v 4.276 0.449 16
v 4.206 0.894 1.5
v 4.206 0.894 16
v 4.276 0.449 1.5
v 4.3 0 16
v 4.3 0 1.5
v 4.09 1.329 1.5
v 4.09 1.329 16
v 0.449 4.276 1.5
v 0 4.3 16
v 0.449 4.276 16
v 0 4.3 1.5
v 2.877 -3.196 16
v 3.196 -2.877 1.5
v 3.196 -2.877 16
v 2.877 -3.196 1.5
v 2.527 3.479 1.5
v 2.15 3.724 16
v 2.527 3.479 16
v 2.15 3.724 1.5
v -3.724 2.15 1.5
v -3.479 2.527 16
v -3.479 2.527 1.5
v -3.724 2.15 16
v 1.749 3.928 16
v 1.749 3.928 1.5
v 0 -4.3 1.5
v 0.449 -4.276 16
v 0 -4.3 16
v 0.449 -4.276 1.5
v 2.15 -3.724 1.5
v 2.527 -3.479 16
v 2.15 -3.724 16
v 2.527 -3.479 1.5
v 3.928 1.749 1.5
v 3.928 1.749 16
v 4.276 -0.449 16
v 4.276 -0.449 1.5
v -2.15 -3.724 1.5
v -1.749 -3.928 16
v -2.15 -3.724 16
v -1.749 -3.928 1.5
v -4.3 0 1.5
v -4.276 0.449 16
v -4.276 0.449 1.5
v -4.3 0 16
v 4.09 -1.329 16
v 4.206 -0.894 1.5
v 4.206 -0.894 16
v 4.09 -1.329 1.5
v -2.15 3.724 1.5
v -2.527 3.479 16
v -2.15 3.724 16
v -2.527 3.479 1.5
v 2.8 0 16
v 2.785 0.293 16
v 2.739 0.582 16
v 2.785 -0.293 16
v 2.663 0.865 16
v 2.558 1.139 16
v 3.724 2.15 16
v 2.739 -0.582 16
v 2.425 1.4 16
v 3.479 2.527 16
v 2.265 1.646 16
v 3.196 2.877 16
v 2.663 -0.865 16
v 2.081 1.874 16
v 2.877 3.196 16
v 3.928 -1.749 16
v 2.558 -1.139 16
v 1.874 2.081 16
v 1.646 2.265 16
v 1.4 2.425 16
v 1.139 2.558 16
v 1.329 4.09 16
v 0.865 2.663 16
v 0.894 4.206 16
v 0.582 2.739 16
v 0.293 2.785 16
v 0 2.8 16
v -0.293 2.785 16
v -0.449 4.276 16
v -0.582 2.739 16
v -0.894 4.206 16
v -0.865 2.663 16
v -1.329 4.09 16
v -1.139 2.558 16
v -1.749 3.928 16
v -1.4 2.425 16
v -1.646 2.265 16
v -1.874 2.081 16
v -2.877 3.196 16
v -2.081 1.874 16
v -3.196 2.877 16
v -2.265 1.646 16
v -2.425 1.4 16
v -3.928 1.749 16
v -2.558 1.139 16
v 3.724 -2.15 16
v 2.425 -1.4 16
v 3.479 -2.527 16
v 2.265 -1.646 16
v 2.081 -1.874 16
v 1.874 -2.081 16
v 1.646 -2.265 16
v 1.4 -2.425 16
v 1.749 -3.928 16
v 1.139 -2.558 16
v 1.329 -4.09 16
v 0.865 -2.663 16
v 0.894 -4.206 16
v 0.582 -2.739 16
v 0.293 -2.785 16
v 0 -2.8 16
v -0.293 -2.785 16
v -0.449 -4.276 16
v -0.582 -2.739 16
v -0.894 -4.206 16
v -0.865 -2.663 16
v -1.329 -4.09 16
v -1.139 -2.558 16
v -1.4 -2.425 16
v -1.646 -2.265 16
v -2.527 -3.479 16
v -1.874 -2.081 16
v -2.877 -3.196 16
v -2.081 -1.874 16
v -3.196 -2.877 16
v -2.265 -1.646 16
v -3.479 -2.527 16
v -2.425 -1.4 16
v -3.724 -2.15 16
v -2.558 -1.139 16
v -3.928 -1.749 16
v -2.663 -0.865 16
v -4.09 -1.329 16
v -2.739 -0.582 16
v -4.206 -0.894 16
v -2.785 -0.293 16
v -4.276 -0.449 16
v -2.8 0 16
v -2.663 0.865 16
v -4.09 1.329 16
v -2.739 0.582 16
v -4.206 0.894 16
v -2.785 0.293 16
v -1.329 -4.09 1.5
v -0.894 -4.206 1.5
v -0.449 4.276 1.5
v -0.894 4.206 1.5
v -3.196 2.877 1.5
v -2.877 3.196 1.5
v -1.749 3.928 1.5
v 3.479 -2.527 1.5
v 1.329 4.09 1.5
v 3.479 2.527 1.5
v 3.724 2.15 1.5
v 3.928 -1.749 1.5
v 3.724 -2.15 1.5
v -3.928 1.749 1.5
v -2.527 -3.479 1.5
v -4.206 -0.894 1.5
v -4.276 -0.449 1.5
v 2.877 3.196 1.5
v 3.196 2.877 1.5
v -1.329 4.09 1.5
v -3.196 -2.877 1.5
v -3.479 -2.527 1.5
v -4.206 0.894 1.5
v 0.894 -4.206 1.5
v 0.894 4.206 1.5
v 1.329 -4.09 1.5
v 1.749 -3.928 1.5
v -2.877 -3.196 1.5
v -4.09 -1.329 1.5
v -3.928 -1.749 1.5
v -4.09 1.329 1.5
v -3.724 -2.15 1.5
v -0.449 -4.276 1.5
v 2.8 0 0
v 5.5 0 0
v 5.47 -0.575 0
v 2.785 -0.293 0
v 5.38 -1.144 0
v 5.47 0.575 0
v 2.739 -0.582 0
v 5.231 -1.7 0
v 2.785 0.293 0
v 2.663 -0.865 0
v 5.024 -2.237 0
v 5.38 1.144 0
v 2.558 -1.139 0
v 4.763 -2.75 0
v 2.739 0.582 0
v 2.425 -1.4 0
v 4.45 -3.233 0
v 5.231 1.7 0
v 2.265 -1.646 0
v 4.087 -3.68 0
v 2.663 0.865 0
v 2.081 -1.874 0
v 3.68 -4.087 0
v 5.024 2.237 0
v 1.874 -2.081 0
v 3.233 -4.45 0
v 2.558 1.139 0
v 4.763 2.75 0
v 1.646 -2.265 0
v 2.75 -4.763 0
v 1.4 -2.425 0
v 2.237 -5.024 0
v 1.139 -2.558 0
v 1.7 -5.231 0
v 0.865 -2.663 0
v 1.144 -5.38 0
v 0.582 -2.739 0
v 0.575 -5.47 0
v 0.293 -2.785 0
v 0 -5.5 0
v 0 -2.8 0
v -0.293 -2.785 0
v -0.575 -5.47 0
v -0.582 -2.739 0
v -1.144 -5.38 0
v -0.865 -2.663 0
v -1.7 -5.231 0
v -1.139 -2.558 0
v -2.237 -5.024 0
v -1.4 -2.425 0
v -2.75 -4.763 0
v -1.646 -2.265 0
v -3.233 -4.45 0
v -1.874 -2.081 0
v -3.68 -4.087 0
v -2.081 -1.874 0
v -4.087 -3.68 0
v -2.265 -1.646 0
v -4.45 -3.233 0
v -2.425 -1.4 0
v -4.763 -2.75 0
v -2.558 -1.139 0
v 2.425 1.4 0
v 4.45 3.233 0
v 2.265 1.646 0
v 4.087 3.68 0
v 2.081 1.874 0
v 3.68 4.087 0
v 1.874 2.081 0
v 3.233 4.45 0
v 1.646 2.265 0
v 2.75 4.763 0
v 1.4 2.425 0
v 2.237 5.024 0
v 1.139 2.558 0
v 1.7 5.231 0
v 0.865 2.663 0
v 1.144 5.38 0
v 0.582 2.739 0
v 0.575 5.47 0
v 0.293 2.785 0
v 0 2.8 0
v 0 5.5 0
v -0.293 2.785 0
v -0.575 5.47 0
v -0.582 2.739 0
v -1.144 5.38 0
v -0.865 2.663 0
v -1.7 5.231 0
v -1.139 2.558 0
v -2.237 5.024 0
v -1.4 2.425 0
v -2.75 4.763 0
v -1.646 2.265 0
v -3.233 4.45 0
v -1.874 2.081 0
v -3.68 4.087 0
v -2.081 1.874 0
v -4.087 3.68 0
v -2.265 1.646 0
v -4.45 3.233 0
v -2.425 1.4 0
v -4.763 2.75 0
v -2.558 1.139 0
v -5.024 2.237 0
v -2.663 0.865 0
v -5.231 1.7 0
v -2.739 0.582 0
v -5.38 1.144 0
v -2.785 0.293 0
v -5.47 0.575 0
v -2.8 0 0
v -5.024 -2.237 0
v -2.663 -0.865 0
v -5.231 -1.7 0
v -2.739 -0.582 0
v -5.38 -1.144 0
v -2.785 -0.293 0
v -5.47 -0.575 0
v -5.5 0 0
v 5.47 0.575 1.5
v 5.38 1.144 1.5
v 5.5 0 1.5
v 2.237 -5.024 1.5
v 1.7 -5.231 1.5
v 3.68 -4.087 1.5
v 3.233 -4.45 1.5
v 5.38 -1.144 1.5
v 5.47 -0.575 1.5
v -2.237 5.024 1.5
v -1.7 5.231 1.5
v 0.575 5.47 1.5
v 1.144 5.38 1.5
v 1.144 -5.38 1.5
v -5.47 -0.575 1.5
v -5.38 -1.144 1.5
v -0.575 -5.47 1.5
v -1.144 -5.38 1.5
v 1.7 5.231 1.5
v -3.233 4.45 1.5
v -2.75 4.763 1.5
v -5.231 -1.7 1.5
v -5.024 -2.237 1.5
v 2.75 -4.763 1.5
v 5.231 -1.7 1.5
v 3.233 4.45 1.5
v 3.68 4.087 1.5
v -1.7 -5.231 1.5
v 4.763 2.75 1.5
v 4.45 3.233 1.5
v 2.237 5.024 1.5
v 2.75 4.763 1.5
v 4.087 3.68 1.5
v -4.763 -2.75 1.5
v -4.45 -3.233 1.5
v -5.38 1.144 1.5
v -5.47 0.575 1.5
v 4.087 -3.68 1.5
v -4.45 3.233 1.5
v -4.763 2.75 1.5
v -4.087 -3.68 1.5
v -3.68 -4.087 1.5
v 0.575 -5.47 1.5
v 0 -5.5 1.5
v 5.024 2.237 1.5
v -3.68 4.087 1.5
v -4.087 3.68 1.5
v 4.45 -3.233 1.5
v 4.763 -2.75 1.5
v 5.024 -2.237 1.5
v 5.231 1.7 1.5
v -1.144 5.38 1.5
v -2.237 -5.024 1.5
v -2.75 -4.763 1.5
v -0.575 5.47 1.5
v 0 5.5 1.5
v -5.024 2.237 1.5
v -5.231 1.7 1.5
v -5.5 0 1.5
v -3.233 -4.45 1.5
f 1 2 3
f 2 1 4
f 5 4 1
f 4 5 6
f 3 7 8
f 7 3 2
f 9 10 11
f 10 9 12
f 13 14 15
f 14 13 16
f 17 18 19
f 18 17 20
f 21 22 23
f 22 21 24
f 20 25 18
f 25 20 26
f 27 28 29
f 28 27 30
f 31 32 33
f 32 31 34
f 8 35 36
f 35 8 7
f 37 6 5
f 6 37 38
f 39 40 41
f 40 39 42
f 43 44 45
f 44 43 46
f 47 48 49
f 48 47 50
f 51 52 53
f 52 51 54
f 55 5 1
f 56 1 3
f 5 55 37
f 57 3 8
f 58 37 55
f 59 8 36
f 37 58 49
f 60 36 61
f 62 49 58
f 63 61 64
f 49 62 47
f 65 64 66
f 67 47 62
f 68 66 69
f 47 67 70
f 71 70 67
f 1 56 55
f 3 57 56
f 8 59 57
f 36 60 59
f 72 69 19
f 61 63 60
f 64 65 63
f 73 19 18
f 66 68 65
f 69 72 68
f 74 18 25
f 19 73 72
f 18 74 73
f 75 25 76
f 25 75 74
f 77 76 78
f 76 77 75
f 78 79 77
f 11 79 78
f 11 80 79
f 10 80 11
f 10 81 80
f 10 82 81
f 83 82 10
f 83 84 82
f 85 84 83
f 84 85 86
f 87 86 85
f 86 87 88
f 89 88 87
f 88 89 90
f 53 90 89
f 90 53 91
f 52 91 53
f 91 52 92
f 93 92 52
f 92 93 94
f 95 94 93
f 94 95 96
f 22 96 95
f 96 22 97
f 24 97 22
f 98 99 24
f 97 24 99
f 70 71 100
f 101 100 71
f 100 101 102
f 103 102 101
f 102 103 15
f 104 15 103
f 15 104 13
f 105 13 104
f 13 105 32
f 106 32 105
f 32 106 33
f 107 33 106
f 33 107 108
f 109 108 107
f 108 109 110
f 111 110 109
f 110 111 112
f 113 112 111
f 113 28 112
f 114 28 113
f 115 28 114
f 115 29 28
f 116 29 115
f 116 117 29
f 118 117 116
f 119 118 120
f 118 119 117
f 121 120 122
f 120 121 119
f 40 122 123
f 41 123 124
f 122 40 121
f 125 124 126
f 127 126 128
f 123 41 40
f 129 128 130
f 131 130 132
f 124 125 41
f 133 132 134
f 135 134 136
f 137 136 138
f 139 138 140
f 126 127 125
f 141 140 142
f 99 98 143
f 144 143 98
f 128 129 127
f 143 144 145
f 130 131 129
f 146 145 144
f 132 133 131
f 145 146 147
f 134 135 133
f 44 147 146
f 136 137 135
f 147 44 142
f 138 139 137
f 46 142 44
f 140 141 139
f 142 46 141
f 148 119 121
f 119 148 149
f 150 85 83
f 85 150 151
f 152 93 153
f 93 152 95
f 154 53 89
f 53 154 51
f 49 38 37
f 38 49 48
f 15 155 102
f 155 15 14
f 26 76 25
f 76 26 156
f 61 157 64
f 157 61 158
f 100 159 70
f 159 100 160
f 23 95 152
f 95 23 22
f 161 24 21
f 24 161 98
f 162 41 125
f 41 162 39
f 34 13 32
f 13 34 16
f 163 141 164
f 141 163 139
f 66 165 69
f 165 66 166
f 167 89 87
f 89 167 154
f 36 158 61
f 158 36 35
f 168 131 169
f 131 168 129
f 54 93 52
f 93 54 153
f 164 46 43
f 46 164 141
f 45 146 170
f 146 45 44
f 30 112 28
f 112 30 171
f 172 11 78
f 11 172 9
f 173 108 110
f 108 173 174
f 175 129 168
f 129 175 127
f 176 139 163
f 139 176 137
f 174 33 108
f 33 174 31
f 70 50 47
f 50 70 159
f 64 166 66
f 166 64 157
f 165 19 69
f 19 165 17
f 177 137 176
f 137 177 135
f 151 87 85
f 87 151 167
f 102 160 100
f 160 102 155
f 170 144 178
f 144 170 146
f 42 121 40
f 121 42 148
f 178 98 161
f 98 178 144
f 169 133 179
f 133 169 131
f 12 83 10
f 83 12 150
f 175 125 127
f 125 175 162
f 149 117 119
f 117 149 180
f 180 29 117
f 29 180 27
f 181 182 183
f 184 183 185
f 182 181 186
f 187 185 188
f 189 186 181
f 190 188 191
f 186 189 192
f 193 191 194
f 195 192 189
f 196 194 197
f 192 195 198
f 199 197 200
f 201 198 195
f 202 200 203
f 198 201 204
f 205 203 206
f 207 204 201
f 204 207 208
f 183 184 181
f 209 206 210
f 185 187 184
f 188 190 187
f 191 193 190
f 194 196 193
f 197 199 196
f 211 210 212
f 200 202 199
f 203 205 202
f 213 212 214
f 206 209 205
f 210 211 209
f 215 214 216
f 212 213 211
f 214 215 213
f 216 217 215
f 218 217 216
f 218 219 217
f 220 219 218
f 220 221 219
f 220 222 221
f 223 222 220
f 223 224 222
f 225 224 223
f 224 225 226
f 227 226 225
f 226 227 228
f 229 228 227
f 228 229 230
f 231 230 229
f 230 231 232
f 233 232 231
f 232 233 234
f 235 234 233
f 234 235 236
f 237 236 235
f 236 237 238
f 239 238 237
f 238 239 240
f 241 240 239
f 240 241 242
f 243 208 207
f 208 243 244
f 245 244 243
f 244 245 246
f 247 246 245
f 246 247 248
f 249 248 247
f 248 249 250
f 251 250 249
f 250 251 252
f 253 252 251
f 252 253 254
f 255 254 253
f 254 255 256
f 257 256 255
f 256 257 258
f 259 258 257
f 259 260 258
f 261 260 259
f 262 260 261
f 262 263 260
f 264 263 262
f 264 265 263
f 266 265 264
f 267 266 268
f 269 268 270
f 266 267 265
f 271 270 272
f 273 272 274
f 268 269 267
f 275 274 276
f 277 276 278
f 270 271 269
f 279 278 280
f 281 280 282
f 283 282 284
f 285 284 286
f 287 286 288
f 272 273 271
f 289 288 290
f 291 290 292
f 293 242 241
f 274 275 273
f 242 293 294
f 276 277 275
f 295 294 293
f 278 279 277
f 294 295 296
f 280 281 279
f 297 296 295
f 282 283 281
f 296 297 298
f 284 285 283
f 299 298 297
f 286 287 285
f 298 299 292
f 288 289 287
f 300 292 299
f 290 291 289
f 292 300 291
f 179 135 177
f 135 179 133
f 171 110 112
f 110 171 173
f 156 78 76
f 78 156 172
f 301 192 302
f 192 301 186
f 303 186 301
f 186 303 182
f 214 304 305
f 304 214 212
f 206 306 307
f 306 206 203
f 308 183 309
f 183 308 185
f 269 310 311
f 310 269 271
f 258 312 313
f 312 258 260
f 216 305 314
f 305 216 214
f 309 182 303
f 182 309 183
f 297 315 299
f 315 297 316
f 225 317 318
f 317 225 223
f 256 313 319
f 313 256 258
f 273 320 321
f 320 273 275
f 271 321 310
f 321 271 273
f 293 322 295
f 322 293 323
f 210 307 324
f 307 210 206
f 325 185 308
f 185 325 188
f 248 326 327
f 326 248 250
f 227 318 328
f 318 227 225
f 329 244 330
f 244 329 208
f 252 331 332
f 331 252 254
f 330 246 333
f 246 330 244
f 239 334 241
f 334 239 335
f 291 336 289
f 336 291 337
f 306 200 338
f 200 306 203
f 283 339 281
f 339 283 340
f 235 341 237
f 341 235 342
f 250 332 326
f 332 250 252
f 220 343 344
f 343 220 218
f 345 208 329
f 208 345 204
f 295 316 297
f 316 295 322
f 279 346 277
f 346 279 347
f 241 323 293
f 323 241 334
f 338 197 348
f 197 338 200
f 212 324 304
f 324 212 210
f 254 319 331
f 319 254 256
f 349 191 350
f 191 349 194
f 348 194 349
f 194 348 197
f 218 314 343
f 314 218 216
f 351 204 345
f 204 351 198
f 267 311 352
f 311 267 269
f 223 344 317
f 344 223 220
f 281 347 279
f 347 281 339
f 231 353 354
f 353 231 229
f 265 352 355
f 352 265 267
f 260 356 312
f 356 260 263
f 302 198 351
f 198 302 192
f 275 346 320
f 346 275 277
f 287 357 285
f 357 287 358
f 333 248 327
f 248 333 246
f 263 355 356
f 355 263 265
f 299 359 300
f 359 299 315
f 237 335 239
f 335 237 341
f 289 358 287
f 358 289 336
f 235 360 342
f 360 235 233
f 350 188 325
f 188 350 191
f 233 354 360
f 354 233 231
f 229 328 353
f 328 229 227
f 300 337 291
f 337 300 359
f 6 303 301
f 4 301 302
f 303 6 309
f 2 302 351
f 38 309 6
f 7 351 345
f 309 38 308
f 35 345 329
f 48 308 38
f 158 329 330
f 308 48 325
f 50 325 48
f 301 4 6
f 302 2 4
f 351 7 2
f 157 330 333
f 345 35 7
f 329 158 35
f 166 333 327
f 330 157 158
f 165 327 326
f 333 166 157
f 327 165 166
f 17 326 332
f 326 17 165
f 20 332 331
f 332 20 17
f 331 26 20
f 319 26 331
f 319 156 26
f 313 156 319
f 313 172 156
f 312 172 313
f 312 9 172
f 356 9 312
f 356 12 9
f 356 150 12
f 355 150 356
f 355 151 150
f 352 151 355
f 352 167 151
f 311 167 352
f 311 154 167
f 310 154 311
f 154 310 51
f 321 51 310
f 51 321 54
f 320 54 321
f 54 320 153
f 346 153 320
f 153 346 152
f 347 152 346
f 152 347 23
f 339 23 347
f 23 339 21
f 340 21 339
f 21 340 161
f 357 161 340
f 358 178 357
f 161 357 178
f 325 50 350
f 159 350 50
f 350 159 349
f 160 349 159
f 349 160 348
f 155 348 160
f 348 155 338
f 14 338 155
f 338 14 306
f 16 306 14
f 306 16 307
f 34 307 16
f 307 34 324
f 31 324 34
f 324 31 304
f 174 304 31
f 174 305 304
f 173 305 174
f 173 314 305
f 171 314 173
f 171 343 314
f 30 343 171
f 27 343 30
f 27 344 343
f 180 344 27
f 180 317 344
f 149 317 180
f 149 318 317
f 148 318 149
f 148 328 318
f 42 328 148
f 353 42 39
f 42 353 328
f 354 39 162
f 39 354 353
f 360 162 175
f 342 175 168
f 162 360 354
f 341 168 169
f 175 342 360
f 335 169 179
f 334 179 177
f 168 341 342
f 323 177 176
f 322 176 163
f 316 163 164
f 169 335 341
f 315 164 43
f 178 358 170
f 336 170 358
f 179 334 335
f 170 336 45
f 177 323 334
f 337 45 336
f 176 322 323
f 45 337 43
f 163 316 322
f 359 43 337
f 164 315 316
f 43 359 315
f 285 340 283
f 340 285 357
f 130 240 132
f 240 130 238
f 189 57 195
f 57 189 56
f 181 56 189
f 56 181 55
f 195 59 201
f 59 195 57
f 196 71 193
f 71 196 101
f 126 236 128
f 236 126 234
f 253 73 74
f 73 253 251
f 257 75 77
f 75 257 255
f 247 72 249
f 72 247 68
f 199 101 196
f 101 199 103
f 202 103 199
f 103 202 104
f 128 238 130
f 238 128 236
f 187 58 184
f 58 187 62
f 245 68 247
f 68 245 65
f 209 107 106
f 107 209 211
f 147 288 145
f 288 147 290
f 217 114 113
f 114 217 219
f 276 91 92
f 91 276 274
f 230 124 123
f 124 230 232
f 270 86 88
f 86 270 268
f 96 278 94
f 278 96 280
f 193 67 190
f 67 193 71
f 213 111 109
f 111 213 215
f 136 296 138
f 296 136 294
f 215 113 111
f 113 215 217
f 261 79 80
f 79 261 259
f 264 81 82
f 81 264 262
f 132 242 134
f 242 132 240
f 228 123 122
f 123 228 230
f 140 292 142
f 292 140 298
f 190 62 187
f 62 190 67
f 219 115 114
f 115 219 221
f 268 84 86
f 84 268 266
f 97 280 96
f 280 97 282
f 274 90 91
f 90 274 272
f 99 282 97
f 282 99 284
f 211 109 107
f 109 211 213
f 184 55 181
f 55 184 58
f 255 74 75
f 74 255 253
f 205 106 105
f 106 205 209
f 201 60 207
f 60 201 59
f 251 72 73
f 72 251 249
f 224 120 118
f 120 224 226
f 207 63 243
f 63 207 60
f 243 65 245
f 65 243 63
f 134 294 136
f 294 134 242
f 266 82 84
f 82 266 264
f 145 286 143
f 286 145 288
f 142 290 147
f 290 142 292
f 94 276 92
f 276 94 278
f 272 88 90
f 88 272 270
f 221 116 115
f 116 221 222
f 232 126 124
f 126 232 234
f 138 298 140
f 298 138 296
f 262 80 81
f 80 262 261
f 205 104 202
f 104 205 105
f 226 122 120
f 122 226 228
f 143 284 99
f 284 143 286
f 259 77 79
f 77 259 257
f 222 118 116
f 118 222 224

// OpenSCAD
// Blind-rivet body.
$fn = 60;
eps = 0.02;
shank_d = 5.6;
head_d = 11;
length = 16;
difference() { union() { cylinder(d=shank_d+3,h=length); cylinder(d=max(head_d, shank_d+5),h=1.5); } translate([0,0,-eps]) cylinder(d=shank_d,h=length+2*eps); }
